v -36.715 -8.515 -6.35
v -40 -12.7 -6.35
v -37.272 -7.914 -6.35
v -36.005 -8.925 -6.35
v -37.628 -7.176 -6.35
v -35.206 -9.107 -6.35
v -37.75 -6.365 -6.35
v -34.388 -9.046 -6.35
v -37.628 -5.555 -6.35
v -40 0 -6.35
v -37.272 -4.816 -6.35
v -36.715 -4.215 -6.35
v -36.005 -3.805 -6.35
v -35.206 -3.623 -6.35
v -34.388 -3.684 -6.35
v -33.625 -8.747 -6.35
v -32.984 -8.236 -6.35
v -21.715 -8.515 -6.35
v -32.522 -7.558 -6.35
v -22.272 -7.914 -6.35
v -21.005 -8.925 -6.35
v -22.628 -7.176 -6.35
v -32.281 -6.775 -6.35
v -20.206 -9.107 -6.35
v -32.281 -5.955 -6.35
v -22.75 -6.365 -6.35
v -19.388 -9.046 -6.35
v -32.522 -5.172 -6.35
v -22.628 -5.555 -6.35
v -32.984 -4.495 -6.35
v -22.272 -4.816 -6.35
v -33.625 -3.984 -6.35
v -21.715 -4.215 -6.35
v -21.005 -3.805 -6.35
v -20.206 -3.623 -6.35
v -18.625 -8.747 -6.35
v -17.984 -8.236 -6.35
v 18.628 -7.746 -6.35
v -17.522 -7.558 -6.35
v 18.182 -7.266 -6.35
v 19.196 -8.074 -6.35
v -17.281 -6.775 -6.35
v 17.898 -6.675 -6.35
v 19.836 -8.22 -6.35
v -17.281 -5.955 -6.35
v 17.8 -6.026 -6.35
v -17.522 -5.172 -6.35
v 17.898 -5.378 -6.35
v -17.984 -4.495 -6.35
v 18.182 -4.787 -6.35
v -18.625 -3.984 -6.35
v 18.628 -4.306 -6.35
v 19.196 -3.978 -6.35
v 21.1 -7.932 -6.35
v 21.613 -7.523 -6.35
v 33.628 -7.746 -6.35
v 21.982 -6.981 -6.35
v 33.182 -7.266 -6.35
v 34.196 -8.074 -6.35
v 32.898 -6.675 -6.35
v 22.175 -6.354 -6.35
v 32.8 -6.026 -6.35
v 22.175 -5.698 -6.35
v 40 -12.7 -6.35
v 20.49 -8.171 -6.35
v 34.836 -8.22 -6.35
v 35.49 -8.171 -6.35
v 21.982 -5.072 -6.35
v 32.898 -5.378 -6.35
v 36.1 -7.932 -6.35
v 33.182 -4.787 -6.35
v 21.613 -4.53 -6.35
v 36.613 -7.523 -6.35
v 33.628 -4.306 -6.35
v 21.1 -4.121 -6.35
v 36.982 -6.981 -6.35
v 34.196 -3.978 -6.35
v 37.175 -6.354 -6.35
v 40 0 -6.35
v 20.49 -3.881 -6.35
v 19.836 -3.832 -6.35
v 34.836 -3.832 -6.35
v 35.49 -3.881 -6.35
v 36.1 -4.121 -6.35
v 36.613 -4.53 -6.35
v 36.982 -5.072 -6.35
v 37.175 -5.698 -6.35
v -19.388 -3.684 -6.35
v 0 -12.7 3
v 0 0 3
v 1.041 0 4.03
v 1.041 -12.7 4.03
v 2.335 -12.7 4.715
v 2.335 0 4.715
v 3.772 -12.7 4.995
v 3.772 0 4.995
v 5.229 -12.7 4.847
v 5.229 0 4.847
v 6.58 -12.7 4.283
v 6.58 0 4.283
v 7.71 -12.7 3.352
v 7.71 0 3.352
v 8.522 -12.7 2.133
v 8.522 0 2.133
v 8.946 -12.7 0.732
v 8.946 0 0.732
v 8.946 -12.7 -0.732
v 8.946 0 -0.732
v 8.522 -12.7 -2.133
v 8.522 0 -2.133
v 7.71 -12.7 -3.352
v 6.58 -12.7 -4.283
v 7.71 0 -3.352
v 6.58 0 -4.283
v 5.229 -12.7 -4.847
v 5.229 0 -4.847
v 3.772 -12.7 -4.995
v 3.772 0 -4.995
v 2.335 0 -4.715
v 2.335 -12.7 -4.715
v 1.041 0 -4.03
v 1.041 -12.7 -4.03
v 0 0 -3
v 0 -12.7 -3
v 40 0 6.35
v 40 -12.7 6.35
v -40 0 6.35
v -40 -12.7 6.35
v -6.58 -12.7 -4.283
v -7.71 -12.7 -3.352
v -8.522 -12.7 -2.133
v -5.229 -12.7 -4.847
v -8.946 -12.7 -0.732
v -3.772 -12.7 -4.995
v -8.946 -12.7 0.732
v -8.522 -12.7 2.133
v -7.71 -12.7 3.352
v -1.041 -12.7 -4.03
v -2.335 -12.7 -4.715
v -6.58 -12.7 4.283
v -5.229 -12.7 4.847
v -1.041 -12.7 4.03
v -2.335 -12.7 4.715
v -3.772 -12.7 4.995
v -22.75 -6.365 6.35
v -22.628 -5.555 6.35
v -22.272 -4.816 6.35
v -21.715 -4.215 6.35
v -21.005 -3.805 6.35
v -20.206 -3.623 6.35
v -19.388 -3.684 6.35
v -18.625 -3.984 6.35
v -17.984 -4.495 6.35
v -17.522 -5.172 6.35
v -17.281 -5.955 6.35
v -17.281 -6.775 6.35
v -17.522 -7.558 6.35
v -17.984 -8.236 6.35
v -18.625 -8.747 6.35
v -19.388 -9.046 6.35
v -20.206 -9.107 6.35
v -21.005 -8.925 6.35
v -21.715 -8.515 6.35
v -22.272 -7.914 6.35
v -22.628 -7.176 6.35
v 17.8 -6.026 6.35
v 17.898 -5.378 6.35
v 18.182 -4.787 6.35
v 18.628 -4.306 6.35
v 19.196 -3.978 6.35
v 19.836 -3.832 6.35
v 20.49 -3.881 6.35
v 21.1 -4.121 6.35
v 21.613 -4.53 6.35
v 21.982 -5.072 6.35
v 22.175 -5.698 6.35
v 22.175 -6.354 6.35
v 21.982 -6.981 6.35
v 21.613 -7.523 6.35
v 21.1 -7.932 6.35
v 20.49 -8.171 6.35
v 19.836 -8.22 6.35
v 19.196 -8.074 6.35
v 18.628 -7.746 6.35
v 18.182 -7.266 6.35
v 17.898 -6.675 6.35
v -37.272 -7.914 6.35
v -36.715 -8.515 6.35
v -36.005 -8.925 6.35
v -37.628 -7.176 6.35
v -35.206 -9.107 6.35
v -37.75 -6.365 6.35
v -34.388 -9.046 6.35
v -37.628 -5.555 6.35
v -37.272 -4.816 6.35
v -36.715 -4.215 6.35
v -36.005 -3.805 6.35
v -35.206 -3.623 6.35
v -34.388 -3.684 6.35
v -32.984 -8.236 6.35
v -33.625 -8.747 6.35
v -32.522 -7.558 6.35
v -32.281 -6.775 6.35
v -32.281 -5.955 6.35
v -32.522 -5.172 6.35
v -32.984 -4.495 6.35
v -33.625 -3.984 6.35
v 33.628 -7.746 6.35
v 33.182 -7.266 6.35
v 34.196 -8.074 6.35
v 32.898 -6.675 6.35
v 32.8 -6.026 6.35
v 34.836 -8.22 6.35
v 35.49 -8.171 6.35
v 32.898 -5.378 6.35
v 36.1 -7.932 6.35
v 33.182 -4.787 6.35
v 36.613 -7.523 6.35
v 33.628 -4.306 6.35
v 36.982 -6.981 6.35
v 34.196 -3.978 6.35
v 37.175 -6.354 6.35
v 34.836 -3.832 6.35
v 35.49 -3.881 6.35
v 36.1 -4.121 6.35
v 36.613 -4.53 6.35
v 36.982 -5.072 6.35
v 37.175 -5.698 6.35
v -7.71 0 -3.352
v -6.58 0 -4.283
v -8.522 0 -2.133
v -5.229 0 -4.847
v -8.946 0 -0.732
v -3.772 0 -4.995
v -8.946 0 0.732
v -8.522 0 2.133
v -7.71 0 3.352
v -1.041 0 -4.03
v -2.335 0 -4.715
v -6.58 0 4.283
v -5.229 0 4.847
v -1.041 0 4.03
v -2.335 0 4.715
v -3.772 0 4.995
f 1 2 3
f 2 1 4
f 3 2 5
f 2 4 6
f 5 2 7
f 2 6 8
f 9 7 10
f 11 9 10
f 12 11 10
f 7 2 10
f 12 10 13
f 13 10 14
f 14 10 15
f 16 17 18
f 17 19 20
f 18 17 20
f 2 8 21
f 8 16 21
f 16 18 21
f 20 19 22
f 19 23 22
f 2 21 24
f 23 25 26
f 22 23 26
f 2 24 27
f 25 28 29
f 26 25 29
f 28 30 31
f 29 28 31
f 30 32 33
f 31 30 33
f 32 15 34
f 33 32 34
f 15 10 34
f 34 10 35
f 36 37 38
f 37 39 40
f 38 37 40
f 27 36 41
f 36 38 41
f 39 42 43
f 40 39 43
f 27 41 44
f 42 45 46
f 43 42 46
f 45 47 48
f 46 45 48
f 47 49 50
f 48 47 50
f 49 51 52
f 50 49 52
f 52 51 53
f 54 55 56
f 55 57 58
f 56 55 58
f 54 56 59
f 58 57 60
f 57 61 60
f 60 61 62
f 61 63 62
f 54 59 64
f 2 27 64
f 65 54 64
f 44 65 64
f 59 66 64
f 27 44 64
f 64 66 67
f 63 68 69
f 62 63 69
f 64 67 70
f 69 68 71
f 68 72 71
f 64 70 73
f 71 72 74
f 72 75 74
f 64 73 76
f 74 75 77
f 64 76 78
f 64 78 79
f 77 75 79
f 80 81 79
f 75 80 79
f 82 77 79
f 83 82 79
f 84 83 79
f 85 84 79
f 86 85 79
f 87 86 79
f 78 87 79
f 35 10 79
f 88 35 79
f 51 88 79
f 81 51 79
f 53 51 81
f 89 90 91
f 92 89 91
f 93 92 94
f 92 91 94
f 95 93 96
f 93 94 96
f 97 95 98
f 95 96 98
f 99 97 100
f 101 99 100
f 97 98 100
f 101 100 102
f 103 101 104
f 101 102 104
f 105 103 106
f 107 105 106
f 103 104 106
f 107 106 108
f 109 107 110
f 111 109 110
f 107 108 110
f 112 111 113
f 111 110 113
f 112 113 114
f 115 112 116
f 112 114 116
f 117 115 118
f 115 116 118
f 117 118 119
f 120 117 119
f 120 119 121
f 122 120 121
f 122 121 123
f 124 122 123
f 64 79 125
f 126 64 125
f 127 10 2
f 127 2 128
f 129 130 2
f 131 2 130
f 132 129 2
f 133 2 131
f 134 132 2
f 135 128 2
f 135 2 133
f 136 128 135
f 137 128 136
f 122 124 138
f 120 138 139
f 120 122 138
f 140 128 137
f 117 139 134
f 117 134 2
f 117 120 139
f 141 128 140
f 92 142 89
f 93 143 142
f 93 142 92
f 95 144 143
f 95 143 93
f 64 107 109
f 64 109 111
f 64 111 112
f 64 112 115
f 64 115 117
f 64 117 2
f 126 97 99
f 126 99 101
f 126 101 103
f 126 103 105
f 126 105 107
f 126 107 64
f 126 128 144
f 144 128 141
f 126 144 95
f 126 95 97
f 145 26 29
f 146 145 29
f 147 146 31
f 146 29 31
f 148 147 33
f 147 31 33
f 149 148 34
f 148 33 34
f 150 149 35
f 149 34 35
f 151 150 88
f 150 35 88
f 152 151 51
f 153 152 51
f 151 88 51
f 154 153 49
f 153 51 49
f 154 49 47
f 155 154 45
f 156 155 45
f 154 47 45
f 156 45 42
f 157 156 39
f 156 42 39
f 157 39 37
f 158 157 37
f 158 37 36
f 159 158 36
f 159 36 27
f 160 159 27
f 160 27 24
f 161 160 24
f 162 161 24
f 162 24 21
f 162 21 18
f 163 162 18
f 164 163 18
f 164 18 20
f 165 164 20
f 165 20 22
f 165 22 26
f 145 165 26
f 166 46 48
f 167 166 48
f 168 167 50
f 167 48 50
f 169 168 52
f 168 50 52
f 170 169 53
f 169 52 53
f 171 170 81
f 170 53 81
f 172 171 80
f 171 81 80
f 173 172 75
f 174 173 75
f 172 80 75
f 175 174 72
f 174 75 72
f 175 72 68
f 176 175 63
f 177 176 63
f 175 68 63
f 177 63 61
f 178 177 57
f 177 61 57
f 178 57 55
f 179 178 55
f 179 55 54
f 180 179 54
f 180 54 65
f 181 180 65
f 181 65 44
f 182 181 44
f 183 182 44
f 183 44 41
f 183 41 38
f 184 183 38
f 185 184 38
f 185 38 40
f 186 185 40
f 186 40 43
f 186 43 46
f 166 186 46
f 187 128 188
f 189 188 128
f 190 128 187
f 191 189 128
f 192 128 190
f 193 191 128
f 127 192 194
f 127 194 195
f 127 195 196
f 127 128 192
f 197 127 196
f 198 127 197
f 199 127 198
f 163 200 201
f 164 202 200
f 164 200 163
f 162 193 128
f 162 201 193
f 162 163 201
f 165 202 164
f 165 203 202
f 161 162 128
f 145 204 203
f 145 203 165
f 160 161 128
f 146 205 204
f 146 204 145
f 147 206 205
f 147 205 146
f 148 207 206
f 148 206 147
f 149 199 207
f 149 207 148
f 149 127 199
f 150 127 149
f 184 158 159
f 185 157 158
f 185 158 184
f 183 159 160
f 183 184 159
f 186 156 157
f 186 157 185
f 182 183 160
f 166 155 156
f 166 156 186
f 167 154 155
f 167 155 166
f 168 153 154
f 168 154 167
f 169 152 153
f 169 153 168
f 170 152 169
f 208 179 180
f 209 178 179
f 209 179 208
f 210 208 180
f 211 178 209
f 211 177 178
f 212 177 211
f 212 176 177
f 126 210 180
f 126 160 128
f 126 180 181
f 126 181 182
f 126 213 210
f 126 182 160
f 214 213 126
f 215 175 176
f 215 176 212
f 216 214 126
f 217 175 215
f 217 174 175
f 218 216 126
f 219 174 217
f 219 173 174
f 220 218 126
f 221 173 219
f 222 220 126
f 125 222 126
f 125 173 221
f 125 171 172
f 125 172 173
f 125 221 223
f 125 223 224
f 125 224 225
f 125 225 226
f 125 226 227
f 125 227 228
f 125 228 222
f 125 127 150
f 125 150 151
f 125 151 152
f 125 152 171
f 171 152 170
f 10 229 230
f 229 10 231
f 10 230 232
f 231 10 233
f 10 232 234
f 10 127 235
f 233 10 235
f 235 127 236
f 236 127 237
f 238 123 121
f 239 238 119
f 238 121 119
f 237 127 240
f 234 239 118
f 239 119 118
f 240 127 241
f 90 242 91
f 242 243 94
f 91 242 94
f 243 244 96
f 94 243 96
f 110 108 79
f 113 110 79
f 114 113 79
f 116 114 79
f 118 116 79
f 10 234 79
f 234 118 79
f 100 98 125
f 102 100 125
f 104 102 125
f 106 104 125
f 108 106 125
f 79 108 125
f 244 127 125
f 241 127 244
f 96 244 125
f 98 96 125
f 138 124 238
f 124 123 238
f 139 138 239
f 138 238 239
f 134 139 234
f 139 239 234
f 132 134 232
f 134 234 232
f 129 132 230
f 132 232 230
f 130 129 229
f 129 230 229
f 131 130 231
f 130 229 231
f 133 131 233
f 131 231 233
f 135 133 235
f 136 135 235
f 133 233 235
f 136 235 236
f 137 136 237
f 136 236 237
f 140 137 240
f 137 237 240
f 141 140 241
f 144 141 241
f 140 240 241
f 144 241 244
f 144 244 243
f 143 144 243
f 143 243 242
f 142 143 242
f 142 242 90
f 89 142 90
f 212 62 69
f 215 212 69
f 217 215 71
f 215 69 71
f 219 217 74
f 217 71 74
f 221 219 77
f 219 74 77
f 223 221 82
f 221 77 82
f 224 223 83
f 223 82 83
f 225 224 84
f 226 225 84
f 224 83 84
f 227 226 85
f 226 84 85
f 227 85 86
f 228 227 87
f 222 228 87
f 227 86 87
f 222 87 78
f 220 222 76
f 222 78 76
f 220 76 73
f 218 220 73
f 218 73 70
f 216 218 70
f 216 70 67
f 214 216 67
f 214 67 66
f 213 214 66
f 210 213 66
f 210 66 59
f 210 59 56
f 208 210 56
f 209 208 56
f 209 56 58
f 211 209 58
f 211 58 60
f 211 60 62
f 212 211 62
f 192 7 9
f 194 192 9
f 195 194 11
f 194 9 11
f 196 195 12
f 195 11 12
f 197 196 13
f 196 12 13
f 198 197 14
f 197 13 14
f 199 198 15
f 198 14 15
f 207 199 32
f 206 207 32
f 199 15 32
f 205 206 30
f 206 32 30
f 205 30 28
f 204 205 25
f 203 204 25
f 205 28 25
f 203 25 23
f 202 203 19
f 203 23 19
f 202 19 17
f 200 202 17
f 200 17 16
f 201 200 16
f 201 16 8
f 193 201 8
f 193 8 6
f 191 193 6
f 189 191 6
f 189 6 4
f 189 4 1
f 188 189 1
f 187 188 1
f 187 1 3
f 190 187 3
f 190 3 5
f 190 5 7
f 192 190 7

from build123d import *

# Parameters (mm, degrees)
F0_W     = 80
F0_H     = 12.7
F1_DEPTH = 12.7
F3_D     = 10
F5_D     = 4.4
F7_D     = 5.5


with BuildPart() as f1:
    # F0 (on Front) → F1 (new body)
    with BuildSketch(Plane.XZ):
        Rectangle(F0_W, F0_H)
    extrude(amount=F1_DEPTH)

    # F3 (through all)
    with Locations(Plane.XZ.offset(12.7)):
        with Locations((-4, 0), (4, 0)):
            Hole(F3_D / 2)

    # F5 (through all)
    with Locations(Plane.XY.offset(6.35)):
        with Locations((20, -6.0262801126), (35, -6.0262801126)):
            Hole(F5_D / 2)

    # F7 (through all)
    with Locations(Plane.XY.offset(6.35)):
        with Locations((-35, -6.3651315868), (-20, -6.3651315868)):
            Hole(F7_D / 2)


solid = f1.part
